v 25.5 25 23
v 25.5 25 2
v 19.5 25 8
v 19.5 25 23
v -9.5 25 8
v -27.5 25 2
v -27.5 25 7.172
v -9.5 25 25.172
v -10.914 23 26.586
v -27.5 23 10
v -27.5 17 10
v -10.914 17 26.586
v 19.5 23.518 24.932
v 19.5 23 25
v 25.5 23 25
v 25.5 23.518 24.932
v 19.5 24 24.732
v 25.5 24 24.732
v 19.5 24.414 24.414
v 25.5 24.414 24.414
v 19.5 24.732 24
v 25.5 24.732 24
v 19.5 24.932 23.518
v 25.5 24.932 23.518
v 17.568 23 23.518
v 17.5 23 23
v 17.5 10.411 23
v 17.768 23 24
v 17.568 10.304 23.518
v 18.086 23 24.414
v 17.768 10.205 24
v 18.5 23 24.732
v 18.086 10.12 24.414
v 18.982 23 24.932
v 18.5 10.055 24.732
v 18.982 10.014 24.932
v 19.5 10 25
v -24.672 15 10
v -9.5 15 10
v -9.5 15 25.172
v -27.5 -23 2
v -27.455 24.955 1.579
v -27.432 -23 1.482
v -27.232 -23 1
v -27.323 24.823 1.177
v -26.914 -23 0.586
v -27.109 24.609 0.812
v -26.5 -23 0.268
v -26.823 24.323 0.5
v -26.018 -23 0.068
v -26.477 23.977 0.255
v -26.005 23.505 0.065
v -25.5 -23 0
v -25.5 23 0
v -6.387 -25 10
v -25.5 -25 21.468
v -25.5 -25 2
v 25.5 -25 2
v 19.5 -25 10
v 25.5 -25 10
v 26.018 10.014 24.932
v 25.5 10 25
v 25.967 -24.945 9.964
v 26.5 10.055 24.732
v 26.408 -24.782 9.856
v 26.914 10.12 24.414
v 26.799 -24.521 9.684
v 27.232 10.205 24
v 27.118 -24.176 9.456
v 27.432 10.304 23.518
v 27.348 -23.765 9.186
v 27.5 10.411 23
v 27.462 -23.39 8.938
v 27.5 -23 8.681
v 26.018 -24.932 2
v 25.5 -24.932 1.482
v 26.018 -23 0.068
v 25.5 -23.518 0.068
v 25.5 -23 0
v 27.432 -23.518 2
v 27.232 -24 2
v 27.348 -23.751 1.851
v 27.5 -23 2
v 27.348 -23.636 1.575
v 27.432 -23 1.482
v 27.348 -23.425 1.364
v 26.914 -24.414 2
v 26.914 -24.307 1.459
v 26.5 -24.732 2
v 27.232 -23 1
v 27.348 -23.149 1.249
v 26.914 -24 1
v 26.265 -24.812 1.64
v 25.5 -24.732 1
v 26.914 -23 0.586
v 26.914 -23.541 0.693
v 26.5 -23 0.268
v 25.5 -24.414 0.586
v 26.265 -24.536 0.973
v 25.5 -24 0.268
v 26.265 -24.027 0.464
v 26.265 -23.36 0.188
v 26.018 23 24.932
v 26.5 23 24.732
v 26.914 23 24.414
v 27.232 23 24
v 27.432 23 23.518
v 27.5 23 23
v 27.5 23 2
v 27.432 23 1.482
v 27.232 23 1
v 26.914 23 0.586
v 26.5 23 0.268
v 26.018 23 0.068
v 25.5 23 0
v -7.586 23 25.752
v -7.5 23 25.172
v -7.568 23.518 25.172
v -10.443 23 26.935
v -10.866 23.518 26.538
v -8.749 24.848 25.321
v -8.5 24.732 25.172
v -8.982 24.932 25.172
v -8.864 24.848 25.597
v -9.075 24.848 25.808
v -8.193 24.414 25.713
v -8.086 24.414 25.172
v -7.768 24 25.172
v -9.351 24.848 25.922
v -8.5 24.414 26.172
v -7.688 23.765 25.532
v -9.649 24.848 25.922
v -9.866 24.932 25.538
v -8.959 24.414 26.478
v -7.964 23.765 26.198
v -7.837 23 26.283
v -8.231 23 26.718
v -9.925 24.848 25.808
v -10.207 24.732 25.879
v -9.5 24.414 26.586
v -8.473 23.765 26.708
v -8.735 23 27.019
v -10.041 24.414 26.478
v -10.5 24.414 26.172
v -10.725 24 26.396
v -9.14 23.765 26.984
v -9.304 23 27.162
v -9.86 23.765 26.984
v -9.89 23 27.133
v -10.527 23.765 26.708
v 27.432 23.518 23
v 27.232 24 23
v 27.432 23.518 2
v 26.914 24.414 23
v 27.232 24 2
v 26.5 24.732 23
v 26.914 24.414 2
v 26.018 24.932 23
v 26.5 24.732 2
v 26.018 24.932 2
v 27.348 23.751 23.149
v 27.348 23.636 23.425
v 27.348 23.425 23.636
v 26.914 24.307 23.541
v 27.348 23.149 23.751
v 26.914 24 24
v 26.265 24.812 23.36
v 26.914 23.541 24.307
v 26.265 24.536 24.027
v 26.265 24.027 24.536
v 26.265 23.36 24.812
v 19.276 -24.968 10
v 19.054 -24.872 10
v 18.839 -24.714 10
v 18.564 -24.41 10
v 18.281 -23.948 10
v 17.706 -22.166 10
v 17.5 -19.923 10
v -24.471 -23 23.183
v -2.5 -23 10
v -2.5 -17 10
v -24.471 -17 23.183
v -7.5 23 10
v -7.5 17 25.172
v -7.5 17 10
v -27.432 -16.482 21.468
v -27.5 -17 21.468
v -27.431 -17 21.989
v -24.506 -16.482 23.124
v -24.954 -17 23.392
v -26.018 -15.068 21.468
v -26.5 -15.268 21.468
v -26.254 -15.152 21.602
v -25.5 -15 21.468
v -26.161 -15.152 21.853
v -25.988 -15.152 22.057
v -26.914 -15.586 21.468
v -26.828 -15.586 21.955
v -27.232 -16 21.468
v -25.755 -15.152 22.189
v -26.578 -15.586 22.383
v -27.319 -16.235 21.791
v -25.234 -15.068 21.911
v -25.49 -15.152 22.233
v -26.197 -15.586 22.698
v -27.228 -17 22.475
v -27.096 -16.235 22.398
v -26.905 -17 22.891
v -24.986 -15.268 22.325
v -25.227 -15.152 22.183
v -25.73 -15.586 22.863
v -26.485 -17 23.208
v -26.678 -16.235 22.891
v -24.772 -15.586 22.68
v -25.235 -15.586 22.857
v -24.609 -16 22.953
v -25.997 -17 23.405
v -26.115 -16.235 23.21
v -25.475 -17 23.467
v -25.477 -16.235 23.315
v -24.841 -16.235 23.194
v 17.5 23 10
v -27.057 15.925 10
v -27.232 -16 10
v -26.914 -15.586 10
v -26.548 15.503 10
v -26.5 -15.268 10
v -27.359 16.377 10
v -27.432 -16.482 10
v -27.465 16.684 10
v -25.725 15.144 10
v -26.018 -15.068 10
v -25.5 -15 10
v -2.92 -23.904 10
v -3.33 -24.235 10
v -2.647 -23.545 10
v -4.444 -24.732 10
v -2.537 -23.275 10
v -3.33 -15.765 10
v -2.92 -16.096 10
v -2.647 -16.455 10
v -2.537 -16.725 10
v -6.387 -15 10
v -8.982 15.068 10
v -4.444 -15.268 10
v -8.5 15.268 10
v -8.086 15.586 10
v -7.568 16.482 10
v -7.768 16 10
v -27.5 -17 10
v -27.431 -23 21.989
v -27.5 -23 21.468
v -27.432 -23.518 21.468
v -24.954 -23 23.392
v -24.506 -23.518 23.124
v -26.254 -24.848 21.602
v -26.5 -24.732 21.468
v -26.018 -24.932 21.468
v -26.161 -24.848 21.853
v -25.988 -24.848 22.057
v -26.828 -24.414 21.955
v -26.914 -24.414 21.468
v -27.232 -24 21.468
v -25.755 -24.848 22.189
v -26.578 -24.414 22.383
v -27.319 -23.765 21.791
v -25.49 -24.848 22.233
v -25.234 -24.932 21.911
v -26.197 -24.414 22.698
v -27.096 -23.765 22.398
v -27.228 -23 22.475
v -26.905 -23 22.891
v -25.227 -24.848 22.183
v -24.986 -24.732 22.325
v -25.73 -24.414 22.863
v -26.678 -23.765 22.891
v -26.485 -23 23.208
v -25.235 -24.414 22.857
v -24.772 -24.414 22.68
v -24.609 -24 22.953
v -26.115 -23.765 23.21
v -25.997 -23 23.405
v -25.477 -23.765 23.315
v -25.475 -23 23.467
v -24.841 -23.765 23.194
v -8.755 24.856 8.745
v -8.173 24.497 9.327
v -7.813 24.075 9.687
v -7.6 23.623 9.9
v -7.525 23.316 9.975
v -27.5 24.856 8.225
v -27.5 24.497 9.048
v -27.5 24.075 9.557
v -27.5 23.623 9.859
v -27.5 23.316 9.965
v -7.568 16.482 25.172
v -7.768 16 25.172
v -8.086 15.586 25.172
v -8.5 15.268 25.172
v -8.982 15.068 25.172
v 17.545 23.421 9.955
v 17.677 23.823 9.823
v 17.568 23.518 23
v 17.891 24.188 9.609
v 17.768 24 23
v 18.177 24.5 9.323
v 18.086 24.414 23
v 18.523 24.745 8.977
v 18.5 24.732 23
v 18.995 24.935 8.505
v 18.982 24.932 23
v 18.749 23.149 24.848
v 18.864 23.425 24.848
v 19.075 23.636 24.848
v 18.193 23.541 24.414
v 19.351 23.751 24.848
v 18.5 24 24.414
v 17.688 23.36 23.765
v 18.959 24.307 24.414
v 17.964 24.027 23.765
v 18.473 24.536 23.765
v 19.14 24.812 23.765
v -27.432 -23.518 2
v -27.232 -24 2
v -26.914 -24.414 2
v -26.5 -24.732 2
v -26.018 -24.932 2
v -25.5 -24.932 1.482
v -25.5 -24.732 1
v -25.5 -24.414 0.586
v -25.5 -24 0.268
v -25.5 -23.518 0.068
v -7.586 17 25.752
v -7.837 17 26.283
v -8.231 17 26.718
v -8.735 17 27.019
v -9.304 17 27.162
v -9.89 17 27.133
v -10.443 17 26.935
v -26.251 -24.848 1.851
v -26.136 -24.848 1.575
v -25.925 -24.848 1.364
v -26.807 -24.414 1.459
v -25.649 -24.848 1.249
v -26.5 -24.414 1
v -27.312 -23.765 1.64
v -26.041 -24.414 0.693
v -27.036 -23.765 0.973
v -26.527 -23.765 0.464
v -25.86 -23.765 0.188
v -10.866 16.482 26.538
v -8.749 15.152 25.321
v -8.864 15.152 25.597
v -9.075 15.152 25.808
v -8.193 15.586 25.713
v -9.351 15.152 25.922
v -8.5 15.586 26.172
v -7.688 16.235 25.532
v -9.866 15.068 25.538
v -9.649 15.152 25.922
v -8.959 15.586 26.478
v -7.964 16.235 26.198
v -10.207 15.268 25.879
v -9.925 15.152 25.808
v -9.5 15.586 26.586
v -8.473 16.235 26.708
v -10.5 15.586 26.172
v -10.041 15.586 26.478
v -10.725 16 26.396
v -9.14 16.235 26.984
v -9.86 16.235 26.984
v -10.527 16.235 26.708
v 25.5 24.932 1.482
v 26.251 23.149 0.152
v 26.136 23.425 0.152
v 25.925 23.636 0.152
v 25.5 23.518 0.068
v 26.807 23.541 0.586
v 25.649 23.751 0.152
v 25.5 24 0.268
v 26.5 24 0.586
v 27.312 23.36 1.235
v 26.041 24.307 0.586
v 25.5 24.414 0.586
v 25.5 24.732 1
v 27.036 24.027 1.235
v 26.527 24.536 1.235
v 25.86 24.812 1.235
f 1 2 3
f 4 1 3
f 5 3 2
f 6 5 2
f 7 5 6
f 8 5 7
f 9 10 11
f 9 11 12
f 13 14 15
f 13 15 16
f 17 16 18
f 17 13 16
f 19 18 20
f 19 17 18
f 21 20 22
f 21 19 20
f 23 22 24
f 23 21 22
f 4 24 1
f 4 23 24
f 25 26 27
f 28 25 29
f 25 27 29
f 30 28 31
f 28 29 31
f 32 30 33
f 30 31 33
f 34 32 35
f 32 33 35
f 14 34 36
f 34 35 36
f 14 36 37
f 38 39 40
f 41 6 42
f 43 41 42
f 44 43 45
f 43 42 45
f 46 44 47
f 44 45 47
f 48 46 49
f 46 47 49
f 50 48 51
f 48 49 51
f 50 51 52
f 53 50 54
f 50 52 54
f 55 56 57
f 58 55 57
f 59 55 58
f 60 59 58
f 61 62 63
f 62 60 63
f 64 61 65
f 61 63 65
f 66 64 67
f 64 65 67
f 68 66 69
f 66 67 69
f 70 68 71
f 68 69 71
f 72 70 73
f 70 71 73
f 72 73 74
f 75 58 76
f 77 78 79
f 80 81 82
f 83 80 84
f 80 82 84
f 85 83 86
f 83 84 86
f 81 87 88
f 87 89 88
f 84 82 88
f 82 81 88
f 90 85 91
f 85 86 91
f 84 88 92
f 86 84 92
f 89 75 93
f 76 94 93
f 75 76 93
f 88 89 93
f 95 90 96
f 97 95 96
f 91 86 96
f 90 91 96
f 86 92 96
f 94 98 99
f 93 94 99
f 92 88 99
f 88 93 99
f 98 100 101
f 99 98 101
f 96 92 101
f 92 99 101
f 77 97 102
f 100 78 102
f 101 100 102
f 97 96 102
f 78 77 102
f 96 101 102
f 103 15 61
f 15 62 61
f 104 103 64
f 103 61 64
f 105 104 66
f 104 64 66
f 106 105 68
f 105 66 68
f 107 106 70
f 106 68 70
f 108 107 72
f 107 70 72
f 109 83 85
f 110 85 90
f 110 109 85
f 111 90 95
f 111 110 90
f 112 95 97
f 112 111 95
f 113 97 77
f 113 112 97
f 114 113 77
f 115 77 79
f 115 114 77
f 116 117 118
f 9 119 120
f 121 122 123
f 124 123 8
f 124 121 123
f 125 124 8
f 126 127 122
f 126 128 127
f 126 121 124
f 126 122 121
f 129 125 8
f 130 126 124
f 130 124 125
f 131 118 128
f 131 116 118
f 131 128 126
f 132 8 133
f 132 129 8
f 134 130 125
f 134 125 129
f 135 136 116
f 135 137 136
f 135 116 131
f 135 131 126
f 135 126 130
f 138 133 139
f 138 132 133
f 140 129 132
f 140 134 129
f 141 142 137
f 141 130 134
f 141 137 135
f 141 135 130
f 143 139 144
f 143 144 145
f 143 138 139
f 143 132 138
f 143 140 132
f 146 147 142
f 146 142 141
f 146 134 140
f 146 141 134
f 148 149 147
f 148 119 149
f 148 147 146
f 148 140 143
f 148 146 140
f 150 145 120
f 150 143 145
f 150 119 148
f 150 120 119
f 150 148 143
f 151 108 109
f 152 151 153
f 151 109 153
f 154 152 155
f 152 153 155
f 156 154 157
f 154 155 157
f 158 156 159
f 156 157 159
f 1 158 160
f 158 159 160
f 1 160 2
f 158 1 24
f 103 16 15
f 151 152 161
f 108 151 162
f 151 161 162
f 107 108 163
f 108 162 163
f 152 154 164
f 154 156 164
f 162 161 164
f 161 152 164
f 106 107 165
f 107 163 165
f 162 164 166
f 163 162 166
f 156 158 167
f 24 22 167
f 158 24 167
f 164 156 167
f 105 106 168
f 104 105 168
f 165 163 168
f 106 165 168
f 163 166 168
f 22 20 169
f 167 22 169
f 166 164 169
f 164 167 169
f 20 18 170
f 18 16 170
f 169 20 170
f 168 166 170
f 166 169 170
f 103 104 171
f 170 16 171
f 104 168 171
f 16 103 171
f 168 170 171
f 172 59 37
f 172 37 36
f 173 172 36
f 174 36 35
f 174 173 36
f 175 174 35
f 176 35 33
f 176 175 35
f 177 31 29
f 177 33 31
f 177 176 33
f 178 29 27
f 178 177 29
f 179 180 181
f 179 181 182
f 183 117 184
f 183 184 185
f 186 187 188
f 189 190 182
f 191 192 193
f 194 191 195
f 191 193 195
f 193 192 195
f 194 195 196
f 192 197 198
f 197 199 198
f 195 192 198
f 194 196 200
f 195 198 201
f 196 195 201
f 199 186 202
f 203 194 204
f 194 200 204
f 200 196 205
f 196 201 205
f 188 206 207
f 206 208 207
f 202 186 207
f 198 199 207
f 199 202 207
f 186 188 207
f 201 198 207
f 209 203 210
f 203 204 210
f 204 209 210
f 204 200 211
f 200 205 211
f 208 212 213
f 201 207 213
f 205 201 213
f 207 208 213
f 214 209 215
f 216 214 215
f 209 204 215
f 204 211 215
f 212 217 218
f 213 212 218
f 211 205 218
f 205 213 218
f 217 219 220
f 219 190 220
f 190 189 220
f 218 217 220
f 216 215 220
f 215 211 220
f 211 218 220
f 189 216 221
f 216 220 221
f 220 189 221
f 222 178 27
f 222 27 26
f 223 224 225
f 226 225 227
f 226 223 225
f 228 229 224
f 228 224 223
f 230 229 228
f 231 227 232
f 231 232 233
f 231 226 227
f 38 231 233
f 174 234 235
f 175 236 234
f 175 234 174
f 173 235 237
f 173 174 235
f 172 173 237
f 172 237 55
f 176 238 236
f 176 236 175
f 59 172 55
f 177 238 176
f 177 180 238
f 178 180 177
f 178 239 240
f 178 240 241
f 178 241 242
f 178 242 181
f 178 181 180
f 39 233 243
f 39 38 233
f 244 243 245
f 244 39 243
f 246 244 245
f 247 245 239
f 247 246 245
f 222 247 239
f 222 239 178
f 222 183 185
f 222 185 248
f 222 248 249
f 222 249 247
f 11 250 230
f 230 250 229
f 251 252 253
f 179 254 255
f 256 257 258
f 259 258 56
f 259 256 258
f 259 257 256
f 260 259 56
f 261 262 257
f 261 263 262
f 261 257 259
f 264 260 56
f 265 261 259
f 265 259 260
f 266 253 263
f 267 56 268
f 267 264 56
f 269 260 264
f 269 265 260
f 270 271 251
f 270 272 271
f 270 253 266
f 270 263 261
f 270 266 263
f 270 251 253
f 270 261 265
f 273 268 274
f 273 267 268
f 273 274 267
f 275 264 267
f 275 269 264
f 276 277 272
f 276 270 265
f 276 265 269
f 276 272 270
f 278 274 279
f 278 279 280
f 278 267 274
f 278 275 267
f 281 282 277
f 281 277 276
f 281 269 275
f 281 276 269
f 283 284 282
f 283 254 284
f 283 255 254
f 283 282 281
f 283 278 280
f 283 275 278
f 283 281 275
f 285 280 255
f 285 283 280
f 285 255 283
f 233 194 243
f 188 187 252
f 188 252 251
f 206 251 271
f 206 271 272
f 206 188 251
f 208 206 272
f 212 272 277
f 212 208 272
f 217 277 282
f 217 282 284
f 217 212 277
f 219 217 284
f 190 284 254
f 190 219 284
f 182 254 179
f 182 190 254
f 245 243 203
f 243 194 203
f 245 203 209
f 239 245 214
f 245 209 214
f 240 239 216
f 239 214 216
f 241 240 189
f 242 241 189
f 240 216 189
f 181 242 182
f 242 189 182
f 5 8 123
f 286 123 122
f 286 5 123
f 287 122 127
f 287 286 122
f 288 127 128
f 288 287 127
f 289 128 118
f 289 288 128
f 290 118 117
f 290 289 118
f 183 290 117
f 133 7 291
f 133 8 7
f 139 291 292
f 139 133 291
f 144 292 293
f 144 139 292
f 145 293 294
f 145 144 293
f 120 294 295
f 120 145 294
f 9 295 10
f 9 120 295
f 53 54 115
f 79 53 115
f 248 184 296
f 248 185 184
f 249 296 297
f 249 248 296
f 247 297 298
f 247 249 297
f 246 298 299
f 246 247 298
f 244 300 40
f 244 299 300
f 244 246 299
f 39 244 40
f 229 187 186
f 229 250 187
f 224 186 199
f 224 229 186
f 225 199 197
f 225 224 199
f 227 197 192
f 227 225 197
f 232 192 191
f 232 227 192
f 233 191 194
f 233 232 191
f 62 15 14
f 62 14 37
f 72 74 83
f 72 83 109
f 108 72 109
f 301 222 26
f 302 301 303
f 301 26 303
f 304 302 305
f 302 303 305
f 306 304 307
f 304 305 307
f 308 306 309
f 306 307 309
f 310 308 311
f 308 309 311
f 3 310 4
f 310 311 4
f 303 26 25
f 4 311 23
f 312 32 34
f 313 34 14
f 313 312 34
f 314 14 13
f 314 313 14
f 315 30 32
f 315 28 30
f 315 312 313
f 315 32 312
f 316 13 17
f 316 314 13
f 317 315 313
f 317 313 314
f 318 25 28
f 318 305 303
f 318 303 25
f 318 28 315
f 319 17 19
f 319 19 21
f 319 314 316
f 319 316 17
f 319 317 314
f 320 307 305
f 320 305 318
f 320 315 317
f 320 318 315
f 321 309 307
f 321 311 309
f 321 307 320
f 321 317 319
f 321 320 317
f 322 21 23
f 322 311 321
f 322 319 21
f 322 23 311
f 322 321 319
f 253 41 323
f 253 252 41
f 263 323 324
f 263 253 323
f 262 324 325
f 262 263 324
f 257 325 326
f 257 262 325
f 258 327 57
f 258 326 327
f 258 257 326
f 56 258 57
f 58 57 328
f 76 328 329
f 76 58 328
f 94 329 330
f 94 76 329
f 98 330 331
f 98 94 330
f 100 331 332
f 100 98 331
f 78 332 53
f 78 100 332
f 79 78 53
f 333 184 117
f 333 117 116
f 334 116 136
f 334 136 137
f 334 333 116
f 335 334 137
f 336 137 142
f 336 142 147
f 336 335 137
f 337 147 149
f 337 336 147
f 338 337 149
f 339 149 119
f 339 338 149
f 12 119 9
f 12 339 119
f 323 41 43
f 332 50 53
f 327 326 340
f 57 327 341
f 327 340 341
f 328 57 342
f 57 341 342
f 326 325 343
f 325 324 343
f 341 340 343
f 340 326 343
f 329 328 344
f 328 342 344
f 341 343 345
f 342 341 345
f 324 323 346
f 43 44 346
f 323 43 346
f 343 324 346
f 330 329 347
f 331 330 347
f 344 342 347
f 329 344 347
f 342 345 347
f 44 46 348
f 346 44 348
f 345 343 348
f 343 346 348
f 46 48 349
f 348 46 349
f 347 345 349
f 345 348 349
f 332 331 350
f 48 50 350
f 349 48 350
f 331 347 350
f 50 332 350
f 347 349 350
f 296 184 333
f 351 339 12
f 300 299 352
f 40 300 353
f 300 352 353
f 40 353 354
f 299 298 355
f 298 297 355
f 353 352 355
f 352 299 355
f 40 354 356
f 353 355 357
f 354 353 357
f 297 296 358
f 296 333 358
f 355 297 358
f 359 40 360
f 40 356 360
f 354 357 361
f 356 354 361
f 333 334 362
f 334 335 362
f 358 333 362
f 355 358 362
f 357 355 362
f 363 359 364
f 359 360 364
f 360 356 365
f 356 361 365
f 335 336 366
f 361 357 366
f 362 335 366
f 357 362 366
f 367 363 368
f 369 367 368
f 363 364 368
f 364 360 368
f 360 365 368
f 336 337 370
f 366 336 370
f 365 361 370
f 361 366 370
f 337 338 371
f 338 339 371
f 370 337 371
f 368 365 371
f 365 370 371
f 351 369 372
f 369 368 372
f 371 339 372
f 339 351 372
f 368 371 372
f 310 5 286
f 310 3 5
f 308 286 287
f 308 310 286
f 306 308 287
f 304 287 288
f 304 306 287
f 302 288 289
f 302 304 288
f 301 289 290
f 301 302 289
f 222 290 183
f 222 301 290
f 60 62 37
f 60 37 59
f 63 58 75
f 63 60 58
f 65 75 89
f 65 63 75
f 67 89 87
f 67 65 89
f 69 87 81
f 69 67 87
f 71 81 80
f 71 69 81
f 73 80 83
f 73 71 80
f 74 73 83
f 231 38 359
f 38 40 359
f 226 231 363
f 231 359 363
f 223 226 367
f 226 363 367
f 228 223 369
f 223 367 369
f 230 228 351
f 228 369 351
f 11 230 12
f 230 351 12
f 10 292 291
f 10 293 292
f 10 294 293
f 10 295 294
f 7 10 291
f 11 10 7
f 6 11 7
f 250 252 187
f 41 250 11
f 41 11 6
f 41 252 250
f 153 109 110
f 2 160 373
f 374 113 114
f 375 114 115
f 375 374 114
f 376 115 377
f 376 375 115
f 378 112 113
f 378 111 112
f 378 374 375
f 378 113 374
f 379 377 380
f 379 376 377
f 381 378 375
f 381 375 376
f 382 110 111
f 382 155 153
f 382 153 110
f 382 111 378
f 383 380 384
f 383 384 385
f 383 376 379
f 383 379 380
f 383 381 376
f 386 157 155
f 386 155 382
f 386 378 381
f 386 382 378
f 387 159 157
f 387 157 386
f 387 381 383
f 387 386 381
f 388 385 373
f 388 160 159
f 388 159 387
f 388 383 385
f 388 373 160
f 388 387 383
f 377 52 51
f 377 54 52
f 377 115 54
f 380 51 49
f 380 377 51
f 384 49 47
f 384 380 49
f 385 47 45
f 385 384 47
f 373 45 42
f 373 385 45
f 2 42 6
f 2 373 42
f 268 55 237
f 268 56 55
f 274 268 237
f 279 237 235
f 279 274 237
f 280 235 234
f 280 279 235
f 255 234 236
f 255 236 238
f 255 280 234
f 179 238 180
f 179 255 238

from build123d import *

# Parameters (mm, degrees)
F0_W     = 55
F0_H     = 50
F1_DEPTH = 10
F5_DEPTH = 10
F6_DEPTH = 10
F7_DEPTH = 10
F8_R     = 2


with BuildPart() as f1:
    # F0 (on Top) → F1 (new body)
    with BuildSketch(Plane.XY):
        Rectangle(F0_W, F0_H)
    extrude(amount=F1_DEPTH)

    # F4 (on face) → F5 (join)
    with BuildSketch(Plane.YZ.offset(27.5)):
        Polygon((-25, 10), (25, 10), (25, 25), (10, 25), align=None)
    extrude(amount=-F5_DEPTH)

    # F3 (on face) → F6 (join)
    with BuildSketch(Plane(origin=(0, 25, 0), x_dir=(-1, 0, 0), z_dir=(0, 1, 0))):
        Polygon((7.5, 10), (27.5, 10), (7.5, 30), align=None)
    extrude(amount=-F6_DEPTH)

    # F2 (on face) → F7 (join)
    with BuildSketch(Plane.XZ.offset(25)):
        Polygon((-27.5, 25), (-27.5, 10), (-2.5, 10), align=None)
    extrude(amount=-F7_DEPTH)

    # F8
    f8_edges = [f1.edges().sort_by_distance(p)[0] for p in [
        (17.5, 25, 17.5),
        (17.5, 17.5, 25),
        (22.5, 25, 25),
        (27.5, 25, 12.5),
        (27.5, 17.5, 25),
        (17.5, -7.5, 17.5),
        (27.5, -7.5, 17.5),
        (-17.5, 25, 20),
        (-17.5, 15, 20),
        (-7.5, 20, 30),
        (-7.5, 25, 20),
        (5, 25, 10),
        (-7.5, 15, 20),
        (-27.5, 0, 0),
        (-27.5, -15, 17.5),
        (-15, -15, 17.5),
        (-27.5, -20, 25),
        (-27.5, -25, 12.5),
        (-15, -25, 17.5),
        (0, -25, 0),
        (27.5, -25, 5),
        (27.5, 0, 0),
        (0, 25, 0),
    ]]
    fillet(f8_edges, radius=F8_R)


solid = f1.part
